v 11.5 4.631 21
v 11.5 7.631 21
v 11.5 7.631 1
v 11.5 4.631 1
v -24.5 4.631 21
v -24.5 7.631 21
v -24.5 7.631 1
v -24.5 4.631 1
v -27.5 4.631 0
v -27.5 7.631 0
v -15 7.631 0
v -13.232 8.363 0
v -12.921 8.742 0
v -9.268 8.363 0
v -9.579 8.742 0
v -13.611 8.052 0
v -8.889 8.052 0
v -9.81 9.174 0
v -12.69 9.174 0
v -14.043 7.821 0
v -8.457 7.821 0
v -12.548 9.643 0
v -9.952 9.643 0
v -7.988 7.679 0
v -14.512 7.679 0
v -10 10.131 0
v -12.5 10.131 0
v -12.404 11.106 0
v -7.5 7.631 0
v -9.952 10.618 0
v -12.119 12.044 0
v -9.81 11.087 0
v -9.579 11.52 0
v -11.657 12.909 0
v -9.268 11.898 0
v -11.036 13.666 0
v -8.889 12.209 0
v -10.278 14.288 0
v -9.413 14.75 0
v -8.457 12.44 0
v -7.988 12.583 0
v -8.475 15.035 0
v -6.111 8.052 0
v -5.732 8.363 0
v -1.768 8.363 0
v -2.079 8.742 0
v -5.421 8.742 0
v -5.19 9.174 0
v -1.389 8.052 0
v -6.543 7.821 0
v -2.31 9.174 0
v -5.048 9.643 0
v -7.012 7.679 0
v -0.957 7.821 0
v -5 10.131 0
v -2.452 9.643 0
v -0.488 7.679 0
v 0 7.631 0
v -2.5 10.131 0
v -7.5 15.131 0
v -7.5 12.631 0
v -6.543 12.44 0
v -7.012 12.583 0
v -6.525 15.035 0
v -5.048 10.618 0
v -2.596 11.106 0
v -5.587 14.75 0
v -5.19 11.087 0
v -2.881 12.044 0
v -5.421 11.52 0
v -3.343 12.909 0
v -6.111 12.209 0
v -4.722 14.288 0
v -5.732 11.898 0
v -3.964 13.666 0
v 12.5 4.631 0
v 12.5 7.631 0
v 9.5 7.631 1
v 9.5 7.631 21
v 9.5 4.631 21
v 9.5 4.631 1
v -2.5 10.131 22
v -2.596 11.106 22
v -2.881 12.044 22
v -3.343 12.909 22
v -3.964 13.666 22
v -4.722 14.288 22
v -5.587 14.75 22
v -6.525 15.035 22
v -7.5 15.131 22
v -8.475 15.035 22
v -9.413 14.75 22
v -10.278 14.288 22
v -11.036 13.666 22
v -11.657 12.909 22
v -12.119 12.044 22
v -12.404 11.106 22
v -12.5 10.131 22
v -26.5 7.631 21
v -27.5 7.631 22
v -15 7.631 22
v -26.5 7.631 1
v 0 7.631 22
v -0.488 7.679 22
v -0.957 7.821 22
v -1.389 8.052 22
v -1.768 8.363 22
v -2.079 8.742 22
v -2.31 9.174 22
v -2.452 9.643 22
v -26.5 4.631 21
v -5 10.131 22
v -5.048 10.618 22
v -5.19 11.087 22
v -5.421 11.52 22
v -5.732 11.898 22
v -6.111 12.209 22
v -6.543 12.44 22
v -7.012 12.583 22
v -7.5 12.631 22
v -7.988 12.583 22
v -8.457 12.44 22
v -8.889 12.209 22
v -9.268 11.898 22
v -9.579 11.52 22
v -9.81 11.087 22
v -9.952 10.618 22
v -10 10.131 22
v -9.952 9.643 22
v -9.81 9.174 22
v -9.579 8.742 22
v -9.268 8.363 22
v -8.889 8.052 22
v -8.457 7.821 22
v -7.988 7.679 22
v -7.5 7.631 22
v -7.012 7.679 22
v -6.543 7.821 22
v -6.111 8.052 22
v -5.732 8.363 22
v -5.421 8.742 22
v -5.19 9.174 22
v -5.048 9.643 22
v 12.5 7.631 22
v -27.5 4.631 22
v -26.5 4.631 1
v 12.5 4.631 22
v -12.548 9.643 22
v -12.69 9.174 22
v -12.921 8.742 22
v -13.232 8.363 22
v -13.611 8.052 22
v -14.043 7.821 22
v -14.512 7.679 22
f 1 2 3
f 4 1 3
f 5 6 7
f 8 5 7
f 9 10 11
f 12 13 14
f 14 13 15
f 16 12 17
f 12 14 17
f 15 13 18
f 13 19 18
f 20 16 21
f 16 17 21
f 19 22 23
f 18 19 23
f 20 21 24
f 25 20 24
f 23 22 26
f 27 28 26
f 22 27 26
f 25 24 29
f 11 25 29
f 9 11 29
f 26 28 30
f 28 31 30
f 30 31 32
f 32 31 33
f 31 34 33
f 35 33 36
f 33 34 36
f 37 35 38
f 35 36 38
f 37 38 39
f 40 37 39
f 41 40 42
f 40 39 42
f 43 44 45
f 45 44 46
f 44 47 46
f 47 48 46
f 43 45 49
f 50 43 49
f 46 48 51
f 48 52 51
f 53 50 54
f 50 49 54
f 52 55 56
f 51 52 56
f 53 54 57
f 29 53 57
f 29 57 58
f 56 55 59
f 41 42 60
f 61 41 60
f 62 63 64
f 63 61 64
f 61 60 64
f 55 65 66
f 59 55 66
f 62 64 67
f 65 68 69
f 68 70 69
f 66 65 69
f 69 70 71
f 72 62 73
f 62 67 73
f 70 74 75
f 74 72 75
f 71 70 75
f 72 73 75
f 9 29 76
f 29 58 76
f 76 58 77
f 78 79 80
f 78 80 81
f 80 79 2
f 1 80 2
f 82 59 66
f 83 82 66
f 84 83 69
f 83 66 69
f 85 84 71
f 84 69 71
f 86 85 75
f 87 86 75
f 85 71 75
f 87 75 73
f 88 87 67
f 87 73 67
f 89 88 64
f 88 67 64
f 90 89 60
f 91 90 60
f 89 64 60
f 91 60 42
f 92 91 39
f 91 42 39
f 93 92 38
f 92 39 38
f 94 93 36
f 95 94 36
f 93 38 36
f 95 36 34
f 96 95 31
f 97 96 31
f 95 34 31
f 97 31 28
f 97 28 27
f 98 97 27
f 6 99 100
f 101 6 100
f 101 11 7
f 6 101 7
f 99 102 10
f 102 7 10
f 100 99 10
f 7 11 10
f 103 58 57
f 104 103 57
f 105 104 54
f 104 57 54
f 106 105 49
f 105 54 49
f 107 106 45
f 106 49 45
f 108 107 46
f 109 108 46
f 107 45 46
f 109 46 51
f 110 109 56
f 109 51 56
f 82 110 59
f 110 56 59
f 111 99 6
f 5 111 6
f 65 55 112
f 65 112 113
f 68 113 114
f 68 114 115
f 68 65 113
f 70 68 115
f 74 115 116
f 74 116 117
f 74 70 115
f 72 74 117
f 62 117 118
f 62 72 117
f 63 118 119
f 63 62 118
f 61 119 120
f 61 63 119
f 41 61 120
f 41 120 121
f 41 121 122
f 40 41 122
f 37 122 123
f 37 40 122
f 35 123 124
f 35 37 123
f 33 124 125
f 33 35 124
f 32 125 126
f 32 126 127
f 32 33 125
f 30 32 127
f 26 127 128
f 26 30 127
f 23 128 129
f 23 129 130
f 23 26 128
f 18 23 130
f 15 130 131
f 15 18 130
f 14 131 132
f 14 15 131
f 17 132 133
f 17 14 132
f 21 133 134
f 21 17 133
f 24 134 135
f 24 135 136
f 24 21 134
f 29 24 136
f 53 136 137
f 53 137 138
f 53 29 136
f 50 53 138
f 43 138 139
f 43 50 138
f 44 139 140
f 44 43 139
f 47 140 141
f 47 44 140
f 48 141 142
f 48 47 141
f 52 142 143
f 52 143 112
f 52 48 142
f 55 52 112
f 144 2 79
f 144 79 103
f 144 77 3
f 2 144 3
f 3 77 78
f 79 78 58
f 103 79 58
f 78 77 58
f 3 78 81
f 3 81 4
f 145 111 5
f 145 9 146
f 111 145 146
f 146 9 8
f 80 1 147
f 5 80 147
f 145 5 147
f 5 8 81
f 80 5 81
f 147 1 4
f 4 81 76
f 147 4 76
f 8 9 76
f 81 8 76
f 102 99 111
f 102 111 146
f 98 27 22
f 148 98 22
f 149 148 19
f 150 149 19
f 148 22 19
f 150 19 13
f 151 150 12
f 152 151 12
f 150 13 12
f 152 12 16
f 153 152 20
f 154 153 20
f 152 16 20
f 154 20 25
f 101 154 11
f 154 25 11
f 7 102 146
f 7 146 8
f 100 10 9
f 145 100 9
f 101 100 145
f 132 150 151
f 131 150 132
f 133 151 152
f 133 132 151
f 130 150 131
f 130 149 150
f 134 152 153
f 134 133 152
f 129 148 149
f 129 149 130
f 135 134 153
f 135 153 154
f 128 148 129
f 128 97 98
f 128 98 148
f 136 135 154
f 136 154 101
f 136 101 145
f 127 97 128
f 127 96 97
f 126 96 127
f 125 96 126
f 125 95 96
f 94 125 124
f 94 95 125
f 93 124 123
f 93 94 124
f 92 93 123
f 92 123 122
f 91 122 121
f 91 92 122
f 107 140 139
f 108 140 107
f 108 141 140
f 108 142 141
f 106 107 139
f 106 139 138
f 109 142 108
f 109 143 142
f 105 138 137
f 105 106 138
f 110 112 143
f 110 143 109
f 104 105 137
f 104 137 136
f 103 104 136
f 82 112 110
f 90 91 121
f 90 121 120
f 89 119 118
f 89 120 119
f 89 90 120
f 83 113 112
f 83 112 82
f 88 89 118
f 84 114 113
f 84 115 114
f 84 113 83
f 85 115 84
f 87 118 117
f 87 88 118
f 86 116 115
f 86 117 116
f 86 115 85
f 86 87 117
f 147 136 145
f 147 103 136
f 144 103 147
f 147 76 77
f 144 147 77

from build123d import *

# Parameters (mm, degrees)
SKETCH1_R           = 2.5
BOSS_EXTRUDE1_DEPTH = 22
SKETCH3_W           = 2
SKETCH3_H           = 20
CUT_EXTRUDE1_DEPTH  = 15


with BuildPart() as part:
    # Sketch1 → Boss-Extrude1 (new body)
    with BuildSketch(Plane.XY):
        with BuildLine():
            Line((-27.5, 4.630713194), (12.5, 4.630713194))
            Line((12.5, 4.630713194), (12.5, 7.630713194))
            Line((12.5, 7.630713194), (0, 7.630713194))
            ThreePointArc((0, 7.630713194), (-1.767766953, 8.362946241), (-2.5, 10.130713194))
            ThreePointArc((-2.5, 10.130713194), (-7.5, 15.130713194), (-12.5, 10.130713194))
            ThreePointArc((-12.5, 10.130713194), (-13.232233047, 8.362946241), (-15, 7.630713194))
            Line((-15, 7.630713194), (-27.5, 7.630713194))
            Line((-27.5, 7.630713194), (-27.5, 4.630713194))
        make_face()
        with Locations((-7.5, 10.130713194)):
            Circle(SKETCH1_R, mode=Mode.SUBTRACT)
    extrude(amount=BOSS_EXTRUDE1_DEPTH)

    # Sketch3 → Cut-Extrude1 (cut)
    with BuildSketch(Plane(origin=(0, 7.630713194, 0), x_dir=(1, 0, 0), z_dir=(0, 1, 0))):
        with Locations((-25.5, -11)):
            Rectangle(SKETCH3_W, SKETCH3_H)
        with Locations((10.5, -11)):
            Rectangle(SKETCH3_W, SKETCH3_H)
    extrude(amount=-CUT_EXTRUDE1_DEPTH, mode=Mode.SUBTRACT)


solid = part.part
